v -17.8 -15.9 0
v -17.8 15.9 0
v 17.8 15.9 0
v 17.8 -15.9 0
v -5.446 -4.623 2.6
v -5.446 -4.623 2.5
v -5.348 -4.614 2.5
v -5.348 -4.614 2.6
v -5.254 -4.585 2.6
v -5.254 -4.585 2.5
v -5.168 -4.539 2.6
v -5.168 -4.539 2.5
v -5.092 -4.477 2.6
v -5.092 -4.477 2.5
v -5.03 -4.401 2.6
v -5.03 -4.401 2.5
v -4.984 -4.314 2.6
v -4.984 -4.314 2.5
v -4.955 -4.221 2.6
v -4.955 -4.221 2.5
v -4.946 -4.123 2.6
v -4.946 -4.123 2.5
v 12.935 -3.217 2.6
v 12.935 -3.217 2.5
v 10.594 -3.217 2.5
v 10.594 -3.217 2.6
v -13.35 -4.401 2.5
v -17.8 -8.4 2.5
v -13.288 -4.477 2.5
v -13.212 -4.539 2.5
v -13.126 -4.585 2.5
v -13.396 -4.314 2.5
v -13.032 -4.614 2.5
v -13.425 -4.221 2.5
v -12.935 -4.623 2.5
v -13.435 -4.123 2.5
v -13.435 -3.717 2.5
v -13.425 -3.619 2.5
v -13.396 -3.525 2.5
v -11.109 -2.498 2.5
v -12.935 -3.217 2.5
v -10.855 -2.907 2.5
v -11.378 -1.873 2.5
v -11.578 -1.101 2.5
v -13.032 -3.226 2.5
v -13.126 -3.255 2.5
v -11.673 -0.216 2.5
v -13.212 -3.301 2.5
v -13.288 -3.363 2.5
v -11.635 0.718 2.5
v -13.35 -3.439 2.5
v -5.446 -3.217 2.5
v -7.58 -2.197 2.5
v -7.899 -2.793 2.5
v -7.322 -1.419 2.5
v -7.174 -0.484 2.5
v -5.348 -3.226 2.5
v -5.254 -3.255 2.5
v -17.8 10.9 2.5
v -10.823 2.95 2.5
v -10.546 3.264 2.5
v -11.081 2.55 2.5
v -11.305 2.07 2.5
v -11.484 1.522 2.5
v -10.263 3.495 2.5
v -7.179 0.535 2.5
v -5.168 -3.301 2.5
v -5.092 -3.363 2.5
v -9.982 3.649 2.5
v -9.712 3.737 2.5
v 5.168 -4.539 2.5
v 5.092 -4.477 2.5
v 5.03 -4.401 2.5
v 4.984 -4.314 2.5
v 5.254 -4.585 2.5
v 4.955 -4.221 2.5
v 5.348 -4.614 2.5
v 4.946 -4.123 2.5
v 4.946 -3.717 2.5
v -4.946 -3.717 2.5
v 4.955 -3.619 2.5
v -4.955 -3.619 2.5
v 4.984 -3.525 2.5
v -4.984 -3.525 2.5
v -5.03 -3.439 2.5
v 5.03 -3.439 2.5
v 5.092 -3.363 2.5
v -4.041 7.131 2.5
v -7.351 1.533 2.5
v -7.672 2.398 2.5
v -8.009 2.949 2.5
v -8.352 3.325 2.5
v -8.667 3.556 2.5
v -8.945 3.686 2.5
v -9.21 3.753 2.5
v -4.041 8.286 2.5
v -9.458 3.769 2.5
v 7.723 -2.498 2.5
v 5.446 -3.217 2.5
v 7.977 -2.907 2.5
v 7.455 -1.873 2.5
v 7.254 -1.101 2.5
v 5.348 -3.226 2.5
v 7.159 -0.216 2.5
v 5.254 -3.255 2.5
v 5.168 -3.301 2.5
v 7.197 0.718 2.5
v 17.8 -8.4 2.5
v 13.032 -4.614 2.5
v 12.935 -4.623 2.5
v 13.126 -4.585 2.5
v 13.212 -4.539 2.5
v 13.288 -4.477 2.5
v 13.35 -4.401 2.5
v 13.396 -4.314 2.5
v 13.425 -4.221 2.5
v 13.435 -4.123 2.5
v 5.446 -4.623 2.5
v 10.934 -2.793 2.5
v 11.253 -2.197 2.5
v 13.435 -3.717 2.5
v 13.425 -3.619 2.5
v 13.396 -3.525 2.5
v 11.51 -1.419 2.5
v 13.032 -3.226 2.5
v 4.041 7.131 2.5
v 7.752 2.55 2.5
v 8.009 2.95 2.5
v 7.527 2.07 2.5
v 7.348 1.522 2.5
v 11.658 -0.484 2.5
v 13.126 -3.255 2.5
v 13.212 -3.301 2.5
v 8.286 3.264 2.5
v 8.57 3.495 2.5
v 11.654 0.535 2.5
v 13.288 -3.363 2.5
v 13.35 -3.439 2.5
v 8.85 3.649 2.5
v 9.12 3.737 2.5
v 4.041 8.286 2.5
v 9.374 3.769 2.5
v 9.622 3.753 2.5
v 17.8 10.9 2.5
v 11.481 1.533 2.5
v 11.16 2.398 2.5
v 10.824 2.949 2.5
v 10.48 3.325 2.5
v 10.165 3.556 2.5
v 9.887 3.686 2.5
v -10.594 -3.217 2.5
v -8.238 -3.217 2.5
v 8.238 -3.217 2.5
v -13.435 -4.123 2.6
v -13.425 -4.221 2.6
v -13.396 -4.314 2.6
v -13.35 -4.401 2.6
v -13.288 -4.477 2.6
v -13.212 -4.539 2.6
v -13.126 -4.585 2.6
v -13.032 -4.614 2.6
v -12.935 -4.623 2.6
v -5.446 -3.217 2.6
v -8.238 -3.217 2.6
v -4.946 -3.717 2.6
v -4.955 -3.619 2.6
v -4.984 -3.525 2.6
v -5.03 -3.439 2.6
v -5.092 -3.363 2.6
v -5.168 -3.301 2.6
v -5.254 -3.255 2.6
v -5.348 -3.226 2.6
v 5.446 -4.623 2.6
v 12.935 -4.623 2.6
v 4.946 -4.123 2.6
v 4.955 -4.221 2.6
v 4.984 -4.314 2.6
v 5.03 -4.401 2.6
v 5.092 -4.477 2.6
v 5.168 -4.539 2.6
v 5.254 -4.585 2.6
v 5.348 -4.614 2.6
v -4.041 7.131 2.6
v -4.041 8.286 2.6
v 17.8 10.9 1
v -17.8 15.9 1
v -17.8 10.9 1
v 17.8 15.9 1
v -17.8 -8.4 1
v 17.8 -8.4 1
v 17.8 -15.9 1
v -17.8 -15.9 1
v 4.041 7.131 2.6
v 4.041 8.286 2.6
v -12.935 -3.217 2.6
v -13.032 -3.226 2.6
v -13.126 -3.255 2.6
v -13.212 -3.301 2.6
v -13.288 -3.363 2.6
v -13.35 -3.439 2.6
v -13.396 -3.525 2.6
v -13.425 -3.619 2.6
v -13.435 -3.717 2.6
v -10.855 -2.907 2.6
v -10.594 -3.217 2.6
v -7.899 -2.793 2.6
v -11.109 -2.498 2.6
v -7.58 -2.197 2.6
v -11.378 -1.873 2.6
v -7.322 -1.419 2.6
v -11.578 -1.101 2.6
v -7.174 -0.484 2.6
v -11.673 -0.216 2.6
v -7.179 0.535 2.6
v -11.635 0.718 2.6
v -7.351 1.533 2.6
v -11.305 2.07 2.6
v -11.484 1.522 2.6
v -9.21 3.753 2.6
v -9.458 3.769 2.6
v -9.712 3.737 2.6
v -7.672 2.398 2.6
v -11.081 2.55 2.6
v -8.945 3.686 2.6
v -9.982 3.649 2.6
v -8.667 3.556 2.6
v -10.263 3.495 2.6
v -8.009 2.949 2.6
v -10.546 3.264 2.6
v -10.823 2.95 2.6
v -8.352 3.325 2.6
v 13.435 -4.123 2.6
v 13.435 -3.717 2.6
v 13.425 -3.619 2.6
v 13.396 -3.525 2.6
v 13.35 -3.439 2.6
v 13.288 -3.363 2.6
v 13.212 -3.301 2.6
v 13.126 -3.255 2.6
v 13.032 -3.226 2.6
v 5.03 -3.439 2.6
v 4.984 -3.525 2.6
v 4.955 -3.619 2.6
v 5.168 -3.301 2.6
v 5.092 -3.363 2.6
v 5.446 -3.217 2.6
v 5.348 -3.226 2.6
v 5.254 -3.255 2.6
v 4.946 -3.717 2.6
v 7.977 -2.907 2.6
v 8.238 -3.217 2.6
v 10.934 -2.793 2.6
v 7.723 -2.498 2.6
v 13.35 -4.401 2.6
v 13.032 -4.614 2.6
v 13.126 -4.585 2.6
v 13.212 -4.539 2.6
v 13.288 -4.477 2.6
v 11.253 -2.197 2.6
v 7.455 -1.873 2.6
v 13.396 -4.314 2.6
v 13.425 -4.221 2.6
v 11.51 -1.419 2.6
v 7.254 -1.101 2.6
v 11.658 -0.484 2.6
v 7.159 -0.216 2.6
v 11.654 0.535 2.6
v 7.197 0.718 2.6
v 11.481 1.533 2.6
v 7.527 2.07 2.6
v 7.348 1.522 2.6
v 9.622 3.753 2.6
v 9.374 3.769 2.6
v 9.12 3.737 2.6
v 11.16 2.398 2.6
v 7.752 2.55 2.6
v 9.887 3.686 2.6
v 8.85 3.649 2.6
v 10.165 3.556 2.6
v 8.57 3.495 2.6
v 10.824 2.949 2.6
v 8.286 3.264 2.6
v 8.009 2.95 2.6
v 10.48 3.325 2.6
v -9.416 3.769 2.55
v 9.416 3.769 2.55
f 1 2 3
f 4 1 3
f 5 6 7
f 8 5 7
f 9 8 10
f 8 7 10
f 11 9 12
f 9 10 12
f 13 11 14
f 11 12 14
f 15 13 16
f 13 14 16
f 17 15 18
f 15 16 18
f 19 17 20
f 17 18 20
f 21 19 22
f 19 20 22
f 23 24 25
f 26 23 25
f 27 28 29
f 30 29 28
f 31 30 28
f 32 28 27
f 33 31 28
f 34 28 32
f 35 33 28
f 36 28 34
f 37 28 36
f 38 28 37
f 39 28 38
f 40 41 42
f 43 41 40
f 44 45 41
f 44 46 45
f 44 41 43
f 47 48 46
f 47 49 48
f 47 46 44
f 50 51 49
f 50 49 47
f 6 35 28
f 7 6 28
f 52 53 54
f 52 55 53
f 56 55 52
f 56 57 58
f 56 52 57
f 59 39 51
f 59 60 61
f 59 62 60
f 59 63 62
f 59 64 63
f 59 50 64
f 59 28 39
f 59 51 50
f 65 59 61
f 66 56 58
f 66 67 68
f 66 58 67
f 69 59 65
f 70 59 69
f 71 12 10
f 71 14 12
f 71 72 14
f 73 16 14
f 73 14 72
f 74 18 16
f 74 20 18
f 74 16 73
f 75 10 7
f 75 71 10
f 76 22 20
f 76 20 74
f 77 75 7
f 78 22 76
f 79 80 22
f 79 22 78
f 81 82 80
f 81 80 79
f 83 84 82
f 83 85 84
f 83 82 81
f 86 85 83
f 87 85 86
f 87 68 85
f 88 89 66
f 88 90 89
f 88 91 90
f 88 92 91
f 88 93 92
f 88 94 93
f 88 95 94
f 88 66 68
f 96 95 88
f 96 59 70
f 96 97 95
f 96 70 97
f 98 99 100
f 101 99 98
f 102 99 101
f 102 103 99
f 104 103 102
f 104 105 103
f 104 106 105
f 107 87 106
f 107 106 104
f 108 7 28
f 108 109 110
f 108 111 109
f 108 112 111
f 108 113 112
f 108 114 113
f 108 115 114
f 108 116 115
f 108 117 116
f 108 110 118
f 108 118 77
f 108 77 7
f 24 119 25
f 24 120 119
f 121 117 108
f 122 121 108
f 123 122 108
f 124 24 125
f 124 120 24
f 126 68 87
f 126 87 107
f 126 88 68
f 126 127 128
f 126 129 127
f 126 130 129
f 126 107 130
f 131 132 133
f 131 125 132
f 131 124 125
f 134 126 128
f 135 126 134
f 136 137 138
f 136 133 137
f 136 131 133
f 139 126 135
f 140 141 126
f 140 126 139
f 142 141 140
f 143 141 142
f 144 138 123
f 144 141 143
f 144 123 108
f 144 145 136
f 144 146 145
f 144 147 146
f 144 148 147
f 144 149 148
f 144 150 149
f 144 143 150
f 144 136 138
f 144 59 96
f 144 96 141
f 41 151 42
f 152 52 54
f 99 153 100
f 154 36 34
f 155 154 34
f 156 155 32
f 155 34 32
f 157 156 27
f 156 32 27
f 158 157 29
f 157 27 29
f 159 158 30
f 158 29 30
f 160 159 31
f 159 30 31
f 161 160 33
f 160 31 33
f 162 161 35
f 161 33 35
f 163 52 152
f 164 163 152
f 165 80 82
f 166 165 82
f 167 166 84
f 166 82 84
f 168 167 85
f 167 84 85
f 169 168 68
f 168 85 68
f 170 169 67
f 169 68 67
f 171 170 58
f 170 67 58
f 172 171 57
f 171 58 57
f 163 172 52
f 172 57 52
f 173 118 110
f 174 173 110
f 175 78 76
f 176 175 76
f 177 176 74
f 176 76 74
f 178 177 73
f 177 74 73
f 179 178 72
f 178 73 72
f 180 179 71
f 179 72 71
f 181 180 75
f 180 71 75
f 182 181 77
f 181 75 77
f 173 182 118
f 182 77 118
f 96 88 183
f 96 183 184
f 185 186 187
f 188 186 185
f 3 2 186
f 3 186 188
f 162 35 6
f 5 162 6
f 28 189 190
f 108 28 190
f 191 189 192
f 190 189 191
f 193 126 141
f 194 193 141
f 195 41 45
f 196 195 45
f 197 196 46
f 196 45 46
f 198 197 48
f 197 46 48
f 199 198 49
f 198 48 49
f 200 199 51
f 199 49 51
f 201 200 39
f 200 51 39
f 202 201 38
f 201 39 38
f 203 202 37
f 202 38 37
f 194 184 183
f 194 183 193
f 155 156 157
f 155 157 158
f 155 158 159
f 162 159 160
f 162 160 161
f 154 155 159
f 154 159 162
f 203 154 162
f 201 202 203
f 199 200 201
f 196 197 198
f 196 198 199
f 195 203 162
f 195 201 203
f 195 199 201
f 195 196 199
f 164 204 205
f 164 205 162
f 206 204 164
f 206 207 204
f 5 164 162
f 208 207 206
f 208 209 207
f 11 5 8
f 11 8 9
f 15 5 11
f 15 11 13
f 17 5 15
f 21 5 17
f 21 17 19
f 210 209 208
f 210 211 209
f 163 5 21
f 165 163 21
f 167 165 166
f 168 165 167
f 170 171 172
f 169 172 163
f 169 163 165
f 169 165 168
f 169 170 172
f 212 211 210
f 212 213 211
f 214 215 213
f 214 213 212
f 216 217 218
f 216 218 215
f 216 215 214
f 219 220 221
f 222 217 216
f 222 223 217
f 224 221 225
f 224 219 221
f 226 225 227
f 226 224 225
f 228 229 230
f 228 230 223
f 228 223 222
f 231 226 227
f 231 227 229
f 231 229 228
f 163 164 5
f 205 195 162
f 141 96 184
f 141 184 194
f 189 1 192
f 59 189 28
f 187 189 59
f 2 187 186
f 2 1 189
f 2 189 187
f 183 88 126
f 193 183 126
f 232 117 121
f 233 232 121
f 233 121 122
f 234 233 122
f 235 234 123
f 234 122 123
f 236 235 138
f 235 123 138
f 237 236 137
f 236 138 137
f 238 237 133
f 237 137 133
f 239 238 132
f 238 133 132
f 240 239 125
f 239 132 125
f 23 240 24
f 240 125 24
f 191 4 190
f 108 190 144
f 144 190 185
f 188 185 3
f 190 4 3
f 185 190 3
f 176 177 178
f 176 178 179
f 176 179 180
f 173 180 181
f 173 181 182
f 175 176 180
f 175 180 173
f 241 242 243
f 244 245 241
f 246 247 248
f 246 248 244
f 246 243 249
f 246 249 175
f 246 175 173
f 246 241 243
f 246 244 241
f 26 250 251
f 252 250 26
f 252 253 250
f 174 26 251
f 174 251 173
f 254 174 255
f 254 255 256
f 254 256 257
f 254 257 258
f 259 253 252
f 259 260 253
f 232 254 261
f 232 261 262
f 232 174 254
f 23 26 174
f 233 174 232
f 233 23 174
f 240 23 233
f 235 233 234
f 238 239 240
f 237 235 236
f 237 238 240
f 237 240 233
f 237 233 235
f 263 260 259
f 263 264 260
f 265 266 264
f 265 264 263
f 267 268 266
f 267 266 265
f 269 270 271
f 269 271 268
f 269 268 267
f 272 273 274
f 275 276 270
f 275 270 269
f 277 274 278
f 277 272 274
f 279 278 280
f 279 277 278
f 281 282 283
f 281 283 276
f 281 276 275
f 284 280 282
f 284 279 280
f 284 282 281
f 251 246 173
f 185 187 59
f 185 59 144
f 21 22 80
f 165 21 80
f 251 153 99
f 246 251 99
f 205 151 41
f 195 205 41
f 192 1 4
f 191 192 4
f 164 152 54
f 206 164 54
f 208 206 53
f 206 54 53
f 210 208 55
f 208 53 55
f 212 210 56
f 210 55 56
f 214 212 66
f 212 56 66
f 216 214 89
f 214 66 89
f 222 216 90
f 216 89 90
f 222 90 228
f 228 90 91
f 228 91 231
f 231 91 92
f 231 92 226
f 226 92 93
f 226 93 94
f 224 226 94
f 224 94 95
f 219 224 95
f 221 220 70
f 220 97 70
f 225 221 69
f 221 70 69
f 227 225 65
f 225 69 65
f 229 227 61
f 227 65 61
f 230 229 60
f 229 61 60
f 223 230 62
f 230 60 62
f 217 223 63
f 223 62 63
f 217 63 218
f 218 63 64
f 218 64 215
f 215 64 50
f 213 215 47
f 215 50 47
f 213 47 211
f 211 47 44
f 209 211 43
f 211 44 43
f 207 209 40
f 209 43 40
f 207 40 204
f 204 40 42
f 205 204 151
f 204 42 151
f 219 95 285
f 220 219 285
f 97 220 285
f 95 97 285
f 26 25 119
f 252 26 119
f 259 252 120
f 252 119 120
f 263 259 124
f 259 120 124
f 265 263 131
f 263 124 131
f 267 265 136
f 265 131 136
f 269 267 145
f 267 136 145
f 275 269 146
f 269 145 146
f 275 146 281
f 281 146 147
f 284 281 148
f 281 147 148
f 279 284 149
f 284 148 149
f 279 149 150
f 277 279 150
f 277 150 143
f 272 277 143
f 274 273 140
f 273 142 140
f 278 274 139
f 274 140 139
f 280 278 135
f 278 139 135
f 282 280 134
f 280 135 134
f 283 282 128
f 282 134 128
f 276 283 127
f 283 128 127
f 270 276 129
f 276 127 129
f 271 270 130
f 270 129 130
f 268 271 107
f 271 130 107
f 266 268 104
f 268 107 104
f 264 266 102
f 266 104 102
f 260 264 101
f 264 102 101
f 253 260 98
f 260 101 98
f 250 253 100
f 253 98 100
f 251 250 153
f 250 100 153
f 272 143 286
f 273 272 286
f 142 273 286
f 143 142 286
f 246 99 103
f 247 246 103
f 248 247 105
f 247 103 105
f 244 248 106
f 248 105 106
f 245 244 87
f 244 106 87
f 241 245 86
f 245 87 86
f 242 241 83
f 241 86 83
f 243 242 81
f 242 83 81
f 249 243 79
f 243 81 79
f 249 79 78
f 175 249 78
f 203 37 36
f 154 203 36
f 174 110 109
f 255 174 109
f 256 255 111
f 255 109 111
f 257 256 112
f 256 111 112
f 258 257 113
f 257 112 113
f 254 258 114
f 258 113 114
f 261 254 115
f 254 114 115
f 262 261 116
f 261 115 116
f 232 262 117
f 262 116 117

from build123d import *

# Parameters (mm, degrees)
SKETCH_1_W      = 35.6
SKETCH_1_H      = 31.8
EXTRUDE_1_DEPTH = 1
SKETCH_2_W      = 35.6
SKETCH_2_H      = 19.3
EXTRUDE_2_DEPTH = 1.5
SKETCH_3_W      = 8.082791172
SKETCH_3_H      = 1.155308412
EXTRUDE_3_DEPTH = 0.1


with BuildPart() as part:
    # 草图1 → 凸台-拉伸1 (new body)
    with BuildSketch(Plane.XY):
        Rectangle(SKETCH_1_W, SKETCH_1_H)
    extrude(amount=EXTRUDE_1_DEPTH)

    # 草图2 → 凸台-拉伸2 (add)
    with BuildSketch(Plane.XY.offset(1)):
        with Locations((0, 1.25)):
            Rectangle(SKETCH_2_W, SKETCH_2_H)
    extrude(amount=EXTRUDE_2_DEPTH)

    # 草图3 → 凸台-拉伸3 (add)
    with BuildSketch(Plane.XY.offset(2.5)):
        with BuildLine():
            Line((8.23788009, -3.216692679), (5.445549995, -3.216692679))
            ThreePointArc((5.445549995, -3.216692679), (5.091996605, -3.363139288), (4.945549995, -3.716692679))
            Line((4.945549995, -3.716692679), (4.945549995, -4.123155093))
            ThreePointArc((4.945549995, -4.123155093), (5.091996605, -4.476708484), (5.445549995, -4.623155093))
            Line((5.445549995, -4.623155093), (12.934555282, -4.623155093))
            ThreePointArc((12.934555282, -4.623155093), (13.288108672, -4.476708484), (13.434555282, -4.123155093))
            Line((13.434555282, -4.123155093), (13.434555282, -3.716692679))
            ThreePointArc((13.434555282, -3.716692679), (13.288108672, -3.363139288), (12.934555282, -3.216692679))
            Line((12.934555282, -3.216692679), (10.594302392, -3.216692679))
            add(Edge.make_bspline(
                [(10.594302392, -3.216692679), (17.453446302, 3.769231485), (9.416091241, 3.769231485), (1.37873618, 3.769231485), (8.23788009, -3.216692679)],
                knots=[0.54830721, 0.54830721, 0.54830721, 3.141592654, 3.141592654, 5.734878097, 5.734878097, 5.734878097], degree=2, weights=[1, 0.270732248, 1, 0.270732248, 1]))
        make_face()
        with Locations((0, 7.708506432)):
            Rectangle(SKETCH_3_W, SKETCH_3_H)
        with BuildLine():
            Line((-4.945549995, -4.123155093), (-4.945549995, -3.716692679))
            ThreePointArc((-4.945549995, -3.716692679), (-5.091996605, -3.363139288), (-5.445549995, -3.216692679))
            Line((-5.445549995, -3.216692679), (-8.23788009, -3.216692679))
            add(Edge.make_bspline(
                [(-8.23788009, -3.216692679), (-1.37873618, 3.769231485), (-9.416091241, 3.769231485), (-17.453446302, 3.769231485), (-10.594302392, -3.216692679)],
                knots=[0.54830721, 0.54830721, 0.54830721, 3.141592654, 3.141592654, 5.734878097, 5.734878097, 5.734878097], degree=2, weights=[1, 0.270732248, 1, 0.270732248, 1]))
            Line((-10.594302392, -3.216692679), (-12.934555282, -3.216692679))
            ThreePointArc((-12.934555282, -3.216692679), (-13.288108672, -3.363139288), (-13.434555282, -3.716692679))
            Line((-13.434555282, -3.716692679), (-13.434555282, -4.123155093))
            ThreePointArc((-13.434555282, -4.123155093), (-13.288108672, -4.476708484), (-12.934555282, -4.623155093))
            Line((-12.934555282, -4.623155093), (-5.445549995, -4.623155093))
            ThreePointArc((-5.445549995, -4.623155093), (-5.091996605, -4.476708484), (-4.945549995, -4.123155093))
        make_face()
    extrude(amount=EXTRUDE_3_DEPTH)


solid = part.part
